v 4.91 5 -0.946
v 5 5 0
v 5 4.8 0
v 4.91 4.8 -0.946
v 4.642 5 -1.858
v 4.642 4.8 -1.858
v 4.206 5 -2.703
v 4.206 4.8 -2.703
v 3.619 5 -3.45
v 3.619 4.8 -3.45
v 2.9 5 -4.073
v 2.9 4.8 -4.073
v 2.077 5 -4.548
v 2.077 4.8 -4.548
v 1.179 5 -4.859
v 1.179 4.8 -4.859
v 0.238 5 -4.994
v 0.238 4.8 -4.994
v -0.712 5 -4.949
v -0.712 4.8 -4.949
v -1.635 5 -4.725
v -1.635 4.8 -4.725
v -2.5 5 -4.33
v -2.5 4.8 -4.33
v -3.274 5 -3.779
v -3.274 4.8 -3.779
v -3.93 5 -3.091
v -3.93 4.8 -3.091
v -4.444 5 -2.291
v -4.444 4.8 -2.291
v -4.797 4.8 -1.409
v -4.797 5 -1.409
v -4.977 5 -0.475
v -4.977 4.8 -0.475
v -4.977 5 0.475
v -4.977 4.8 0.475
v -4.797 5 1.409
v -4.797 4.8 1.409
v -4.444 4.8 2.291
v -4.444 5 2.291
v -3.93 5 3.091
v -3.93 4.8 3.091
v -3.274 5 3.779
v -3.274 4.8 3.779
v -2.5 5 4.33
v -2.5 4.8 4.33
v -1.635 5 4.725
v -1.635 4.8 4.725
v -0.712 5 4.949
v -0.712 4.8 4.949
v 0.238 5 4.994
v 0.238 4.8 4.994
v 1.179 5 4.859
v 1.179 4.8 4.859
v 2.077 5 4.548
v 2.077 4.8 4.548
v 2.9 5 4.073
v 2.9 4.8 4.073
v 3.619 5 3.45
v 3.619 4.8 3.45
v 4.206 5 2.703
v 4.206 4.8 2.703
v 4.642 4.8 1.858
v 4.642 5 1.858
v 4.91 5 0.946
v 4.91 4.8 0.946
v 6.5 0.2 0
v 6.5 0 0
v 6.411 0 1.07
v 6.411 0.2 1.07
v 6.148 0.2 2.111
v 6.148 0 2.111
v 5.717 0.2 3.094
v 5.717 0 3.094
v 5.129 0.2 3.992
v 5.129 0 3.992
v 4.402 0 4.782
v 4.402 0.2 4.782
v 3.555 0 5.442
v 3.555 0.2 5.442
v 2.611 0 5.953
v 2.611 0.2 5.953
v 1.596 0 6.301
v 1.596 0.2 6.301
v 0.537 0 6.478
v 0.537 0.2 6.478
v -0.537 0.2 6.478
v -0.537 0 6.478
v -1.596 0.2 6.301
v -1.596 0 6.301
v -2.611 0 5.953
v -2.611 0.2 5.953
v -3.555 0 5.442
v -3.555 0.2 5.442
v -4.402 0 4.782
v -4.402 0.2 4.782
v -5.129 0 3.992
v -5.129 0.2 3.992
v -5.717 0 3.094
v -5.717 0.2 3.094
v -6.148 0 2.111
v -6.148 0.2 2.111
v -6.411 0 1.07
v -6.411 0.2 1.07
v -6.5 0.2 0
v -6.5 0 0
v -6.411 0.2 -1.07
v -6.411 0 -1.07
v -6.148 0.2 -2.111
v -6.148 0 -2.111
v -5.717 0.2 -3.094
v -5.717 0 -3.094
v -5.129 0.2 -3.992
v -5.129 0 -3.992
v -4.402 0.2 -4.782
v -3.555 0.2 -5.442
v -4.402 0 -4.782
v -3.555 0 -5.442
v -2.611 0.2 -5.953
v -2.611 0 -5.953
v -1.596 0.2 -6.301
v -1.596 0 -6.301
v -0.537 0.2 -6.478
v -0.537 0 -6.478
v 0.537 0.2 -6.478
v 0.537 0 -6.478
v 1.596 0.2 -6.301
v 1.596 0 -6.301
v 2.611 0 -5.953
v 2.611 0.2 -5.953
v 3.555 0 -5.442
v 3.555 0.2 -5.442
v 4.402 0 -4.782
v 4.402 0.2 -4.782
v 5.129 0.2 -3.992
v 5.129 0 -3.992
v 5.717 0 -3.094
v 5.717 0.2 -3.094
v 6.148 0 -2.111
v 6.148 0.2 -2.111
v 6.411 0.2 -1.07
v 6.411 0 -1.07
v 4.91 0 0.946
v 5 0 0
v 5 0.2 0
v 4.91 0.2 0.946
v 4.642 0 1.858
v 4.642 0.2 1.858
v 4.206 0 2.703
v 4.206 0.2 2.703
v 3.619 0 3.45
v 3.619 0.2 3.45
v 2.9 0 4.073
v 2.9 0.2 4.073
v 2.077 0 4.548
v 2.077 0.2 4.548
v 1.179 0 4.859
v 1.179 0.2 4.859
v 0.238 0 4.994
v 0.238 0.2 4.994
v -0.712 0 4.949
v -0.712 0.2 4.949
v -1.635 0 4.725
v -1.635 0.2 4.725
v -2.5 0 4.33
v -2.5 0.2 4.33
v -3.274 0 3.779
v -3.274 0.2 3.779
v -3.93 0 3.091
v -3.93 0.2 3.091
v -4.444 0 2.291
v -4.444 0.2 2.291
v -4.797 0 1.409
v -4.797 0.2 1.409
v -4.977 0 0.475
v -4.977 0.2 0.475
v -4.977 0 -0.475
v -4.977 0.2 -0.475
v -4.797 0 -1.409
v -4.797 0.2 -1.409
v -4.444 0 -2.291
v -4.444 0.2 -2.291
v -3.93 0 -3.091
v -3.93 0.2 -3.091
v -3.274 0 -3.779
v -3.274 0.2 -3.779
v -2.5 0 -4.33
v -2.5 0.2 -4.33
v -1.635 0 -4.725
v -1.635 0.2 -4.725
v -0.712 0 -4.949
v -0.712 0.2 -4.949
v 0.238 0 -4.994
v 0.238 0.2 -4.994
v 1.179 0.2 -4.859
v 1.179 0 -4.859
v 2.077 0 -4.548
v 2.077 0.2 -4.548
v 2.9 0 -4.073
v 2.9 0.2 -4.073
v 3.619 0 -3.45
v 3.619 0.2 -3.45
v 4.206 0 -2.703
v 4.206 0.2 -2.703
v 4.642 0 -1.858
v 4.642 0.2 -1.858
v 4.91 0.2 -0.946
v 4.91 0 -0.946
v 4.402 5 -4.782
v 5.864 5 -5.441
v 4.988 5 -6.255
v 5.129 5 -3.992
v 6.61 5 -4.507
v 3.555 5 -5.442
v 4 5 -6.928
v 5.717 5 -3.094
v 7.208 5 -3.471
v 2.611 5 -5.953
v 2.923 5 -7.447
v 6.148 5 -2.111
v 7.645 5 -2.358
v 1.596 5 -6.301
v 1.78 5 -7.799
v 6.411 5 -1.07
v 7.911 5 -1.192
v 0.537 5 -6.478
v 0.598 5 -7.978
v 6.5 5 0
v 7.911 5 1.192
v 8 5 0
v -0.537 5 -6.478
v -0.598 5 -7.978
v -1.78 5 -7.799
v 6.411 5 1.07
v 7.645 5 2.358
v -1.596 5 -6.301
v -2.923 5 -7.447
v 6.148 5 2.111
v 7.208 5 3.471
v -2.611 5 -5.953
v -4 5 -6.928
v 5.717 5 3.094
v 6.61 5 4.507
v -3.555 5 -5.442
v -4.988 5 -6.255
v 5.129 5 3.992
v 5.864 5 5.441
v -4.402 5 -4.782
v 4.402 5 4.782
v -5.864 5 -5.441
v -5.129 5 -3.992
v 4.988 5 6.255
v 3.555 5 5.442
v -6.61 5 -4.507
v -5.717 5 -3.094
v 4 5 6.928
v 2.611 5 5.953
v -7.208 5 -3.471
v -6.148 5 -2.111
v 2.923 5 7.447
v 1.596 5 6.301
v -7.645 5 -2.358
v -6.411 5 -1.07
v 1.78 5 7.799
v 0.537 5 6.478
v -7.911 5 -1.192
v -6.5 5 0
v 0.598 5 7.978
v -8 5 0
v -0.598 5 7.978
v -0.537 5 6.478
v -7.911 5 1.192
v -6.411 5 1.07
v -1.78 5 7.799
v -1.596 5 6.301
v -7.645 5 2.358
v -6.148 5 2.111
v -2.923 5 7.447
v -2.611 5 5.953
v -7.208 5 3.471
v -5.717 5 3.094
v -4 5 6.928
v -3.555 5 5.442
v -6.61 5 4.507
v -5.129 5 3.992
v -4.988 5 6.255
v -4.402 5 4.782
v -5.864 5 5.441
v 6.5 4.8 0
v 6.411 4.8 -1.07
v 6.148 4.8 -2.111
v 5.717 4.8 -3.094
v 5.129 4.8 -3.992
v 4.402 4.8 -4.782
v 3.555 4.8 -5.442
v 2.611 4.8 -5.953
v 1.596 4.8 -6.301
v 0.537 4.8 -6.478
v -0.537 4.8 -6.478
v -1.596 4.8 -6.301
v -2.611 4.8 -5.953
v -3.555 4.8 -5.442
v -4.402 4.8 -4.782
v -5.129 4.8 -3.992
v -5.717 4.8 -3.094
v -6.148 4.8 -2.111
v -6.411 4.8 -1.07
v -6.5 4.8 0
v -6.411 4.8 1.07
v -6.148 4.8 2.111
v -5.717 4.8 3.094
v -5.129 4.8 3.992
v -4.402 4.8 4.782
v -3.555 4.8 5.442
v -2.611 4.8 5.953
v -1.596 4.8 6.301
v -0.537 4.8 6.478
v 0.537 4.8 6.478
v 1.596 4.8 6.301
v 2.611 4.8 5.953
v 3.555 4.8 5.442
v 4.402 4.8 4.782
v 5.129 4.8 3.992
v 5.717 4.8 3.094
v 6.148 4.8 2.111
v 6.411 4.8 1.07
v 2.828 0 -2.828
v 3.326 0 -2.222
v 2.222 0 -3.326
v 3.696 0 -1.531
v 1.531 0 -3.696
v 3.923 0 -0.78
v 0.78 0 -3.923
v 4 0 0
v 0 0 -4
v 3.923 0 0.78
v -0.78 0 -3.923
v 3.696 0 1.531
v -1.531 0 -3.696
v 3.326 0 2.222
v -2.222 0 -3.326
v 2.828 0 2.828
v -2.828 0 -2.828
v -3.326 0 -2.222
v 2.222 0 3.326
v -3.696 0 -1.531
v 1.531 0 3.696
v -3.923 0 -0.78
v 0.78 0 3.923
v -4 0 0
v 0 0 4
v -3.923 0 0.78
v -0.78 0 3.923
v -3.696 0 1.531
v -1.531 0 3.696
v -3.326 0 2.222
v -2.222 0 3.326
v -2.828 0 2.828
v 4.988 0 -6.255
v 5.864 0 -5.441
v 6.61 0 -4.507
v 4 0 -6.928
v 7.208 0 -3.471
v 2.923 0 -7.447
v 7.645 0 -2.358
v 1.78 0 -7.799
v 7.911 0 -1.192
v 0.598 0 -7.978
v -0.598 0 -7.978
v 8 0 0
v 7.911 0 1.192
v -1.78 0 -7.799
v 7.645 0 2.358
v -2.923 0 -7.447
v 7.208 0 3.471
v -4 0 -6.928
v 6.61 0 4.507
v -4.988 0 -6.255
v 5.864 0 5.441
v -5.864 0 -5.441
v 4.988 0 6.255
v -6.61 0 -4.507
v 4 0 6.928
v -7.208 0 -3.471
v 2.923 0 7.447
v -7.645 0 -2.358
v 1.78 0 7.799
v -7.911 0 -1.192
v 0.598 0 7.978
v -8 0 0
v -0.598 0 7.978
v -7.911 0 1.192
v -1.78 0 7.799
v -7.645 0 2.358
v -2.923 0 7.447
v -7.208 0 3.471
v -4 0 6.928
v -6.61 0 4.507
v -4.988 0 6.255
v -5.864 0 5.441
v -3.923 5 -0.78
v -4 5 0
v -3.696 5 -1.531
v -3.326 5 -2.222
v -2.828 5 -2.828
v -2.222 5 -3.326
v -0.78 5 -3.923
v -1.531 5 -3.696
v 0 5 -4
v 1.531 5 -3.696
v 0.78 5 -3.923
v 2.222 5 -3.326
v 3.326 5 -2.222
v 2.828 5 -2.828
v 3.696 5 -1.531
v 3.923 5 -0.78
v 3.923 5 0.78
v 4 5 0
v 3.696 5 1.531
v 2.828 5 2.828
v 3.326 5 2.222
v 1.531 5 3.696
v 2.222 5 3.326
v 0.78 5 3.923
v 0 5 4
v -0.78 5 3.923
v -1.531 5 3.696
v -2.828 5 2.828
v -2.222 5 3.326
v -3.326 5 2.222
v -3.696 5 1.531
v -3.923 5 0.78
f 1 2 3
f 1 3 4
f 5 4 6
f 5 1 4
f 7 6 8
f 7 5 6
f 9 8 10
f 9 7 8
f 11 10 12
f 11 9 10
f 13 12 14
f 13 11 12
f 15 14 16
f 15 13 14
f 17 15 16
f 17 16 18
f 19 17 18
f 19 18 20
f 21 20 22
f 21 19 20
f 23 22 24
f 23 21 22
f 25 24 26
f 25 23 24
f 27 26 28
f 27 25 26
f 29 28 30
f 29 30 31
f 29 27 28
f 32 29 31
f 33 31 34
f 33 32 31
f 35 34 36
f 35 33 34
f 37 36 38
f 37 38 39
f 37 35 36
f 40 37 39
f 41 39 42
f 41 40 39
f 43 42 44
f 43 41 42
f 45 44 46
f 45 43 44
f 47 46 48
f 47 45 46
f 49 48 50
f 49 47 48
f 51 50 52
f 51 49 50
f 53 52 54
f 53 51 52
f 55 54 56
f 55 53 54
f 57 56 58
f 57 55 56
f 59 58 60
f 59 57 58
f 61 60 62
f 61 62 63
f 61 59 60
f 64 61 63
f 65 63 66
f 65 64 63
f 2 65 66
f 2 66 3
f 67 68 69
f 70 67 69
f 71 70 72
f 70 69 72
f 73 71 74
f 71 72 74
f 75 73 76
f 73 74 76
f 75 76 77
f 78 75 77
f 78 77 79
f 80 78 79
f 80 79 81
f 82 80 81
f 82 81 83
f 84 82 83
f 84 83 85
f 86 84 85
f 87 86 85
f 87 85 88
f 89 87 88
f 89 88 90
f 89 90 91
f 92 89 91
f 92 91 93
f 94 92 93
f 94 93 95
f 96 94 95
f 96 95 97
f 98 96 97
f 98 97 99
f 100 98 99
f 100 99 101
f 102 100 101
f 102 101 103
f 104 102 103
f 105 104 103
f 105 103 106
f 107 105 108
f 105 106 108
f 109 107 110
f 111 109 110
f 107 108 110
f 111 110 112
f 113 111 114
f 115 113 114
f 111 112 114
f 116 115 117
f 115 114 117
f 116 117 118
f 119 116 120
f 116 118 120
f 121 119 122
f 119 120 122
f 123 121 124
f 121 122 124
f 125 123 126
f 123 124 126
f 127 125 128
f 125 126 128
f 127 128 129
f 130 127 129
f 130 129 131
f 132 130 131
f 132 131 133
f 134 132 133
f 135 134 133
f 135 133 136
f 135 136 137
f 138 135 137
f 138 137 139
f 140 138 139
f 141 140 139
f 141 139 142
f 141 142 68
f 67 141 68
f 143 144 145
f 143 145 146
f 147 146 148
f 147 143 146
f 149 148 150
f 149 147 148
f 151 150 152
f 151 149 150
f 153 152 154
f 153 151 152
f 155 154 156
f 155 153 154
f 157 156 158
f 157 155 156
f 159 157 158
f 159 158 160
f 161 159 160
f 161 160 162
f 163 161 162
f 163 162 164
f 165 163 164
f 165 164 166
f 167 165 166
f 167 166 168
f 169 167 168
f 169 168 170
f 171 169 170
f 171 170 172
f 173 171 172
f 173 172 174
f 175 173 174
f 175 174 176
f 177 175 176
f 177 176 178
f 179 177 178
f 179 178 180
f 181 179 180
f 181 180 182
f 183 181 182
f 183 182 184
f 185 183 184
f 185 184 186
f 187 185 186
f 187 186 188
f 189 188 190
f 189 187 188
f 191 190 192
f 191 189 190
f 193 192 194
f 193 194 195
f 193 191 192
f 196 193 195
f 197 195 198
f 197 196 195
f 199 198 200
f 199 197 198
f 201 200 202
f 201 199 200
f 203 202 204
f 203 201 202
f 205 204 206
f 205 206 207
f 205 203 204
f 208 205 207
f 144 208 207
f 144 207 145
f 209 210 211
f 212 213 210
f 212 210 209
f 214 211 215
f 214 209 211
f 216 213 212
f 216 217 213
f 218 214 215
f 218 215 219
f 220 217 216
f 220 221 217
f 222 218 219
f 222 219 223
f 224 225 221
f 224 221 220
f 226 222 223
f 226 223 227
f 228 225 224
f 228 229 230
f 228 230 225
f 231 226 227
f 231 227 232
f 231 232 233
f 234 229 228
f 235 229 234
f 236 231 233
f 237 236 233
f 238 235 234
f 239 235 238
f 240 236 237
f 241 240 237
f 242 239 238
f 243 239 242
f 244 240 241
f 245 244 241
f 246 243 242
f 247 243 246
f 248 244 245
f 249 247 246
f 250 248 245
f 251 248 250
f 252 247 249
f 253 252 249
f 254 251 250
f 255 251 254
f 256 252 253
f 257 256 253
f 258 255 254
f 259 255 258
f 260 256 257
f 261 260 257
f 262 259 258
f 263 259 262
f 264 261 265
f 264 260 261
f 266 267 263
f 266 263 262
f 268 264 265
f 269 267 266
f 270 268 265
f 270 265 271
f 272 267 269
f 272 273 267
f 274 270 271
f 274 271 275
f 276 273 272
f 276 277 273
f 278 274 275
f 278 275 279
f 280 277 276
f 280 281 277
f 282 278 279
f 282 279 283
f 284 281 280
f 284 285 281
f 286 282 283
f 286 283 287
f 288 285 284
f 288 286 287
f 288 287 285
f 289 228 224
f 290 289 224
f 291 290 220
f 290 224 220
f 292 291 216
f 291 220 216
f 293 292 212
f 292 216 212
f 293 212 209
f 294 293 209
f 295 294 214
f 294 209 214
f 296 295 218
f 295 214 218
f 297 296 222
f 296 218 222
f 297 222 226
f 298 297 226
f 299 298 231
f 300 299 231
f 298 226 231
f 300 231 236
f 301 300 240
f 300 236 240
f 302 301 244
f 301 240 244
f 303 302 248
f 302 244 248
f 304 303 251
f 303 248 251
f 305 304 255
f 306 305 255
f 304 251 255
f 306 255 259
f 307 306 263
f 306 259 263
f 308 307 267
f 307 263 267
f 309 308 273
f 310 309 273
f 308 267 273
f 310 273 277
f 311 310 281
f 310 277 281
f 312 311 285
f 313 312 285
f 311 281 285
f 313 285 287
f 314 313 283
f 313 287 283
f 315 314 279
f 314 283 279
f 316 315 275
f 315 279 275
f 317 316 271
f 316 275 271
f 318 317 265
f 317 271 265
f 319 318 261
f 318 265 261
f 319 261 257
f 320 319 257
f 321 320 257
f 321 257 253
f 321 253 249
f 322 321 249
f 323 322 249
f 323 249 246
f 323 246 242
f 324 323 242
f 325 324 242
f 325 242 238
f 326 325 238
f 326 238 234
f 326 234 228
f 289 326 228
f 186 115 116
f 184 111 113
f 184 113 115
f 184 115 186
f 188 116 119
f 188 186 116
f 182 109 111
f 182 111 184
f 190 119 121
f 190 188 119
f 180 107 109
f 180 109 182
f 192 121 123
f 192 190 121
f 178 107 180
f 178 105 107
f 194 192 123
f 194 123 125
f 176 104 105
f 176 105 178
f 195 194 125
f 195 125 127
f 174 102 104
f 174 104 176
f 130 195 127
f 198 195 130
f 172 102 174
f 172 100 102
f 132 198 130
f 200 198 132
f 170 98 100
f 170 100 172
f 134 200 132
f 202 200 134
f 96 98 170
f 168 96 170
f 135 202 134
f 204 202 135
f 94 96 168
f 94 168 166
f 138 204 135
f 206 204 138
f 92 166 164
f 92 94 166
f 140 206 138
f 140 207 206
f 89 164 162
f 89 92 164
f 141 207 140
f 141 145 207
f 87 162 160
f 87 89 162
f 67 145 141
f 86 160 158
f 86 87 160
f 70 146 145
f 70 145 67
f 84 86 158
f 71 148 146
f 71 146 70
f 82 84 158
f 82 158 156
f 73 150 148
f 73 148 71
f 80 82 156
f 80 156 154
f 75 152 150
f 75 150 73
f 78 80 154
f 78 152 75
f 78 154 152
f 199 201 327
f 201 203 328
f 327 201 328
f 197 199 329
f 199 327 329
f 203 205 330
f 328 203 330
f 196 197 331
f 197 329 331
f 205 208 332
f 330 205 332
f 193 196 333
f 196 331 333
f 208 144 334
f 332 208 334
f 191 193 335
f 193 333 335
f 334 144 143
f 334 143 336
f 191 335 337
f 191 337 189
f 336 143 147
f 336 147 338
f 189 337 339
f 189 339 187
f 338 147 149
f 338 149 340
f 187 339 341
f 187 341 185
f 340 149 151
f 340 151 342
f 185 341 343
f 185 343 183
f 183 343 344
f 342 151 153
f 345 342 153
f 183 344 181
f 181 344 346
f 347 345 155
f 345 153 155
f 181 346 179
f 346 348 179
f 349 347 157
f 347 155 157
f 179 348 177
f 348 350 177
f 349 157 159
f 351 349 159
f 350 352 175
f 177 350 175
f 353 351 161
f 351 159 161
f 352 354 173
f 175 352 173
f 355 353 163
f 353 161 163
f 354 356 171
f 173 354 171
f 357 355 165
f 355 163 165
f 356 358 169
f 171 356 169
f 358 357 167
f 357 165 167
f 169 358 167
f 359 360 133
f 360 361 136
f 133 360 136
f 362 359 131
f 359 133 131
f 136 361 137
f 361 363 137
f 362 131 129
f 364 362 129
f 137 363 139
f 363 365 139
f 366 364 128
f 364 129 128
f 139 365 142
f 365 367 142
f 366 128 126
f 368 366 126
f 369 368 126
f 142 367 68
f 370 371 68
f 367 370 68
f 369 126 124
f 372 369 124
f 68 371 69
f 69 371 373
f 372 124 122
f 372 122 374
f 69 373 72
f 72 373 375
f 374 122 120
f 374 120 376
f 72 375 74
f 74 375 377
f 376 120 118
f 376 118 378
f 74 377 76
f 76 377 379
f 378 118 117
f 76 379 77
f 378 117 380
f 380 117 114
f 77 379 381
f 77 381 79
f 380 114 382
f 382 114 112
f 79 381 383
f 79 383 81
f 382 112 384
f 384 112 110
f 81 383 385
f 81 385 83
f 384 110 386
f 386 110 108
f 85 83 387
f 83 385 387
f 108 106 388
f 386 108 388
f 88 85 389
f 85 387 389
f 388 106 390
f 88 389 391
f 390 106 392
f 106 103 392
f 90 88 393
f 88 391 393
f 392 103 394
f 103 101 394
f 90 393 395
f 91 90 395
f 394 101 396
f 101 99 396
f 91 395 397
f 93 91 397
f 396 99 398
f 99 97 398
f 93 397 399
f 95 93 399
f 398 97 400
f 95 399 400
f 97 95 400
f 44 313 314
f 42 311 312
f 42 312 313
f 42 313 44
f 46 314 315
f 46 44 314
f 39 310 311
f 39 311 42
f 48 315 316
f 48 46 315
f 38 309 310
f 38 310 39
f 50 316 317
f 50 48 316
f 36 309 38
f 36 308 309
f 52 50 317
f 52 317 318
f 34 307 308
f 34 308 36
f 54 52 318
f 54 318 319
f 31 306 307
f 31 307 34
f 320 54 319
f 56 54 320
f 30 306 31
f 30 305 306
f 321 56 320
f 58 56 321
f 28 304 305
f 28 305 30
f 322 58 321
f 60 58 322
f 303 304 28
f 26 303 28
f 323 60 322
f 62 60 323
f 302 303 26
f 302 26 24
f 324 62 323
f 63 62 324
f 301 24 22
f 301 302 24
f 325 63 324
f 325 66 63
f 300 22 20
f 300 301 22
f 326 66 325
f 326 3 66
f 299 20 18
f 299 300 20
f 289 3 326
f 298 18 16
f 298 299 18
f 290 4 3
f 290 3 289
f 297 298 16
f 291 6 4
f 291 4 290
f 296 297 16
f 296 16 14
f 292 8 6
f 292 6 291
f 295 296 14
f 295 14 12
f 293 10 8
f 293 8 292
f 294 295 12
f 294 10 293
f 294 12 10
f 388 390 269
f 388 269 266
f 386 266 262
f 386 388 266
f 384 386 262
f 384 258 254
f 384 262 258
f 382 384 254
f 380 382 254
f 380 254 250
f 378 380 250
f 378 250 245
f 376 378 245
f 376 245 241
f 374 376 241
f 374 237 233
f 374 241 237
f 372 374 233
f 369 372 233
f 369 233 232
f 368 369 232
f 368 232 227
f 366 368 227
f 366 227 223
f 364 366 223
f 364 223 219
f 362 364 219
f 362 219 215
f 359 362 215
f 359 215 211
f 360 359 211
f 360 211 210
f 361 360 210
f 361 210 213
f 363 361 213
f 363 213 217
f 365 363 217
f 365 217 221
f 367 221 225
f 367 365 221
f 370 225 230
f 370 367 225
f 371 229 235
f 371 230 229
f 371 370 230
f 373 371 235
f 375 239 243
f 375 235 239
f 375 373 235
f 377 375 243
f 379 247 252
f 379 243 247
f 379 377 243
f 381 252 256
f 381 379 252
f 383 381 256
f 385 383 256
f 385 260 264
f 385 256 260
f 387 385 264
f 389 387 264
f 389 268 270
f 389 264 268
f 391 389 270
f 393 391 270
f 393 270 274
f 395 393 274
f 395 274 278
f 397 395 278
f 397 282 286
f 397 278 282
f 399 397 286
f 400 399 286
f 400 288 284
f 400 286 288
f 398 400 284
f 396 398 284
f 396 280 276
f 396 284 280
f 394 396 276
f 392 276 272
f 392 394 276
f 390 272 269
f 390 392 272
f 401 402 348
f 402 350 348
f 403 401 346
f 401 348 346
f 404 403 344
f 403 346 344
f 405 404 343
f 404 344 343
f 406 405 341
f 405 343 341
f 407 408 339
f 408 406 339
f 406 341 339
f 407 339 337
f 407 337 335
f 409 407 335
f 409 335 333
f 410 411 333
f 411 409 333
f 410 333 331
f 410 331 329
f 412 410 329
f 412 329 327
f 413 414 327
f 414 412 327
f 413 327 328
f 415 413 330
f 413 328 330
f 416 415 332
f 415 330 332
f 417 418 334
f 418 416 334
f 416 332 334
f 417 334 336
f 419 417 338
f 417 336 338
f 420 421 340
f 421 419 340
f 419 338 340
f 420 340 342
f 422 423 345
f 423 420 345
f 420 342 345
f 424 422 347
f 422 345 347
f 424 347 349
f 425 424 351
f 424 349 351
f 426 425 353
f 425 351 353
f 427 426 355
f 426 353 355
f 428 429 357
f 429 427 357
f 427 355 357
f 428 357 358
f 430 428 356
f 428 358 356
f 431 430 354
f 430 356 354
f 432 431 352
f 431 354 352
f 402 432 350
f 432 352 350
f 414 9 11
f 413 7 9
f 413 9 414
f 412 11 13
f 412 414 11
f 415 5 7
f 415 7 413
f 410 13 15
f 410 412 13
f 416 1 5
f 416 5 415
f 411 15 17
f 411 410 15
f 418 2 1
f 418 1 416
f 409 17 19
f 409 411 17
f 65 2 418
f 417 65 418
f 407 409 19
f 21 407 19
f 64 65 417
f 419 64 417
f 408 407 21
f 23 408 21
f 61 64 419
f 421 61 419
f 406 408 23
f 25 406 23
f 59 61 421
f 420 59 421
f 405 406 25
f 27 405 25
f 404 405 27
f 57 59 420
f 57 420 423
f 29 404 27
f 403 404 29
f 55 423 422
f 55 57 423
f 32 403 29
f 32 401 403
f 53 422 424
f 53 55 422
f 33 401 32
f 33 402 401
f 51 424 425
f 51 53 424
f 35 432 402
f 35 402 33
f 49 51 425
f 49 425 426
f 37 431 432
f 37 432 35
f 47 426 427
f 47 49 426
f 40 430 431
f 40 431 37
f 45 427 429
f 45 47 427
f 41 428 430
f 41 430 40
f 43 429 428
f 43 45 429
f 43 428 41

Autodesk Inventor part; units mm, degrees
ref_plane "YZ Plane" through (0, 0, 0) normal (1, 0, 0) x (0, 1, 0)
ref_plane "XZ Plane" through (0, 0, 0) normal (0, 1, 0) x (-1, 0, 0)
ref_plane "XY Plane" through (0, 0, 0) normal (0, 0, 1) x (1, 0, 0)
sketch "Sketch1" plane through (0, 0, 0) normal (0, 1, 0) x (-1, 0, 0)
  circle A0 centre (0, 0) radius 4
  circle A1 centre (0, 0) radius 8
  dimension "d0" = 8
  dimension "d1" = 16
extrude "Extrusion1" add sketch "Sketch1" along normal blind 5
sketch "Sketch2" plane through (0, 5, 0) normal (0, 1, 0) x (1, 0, 0)
  circle A0 centre (0, 0) radius 8 projected
  circle A1 centre (0, 0) radius 4 projected
  circle A2 centre (0, 0) radius 5
  circle A3 centre (0, 0) radius 6.5
  dimension "d4" = 10
  dimension "d5" = 13
extrude "Extrusion2" cut sketch "Sketch2" against normal blind 0.2 contours A3
sketch "Sketch3" plane through (0, 0, 0) normal (0, -1, 0) x (1, 0, 0)
  circle A0 centre (0, 0) radius 5 projected
  circle A1 centre (0, 0) radius 6.5 projected
extrude "Extrusion3" cut sketch "Sketch3" against normal blind 0.2
properties part number "bearing_8_16_5"
